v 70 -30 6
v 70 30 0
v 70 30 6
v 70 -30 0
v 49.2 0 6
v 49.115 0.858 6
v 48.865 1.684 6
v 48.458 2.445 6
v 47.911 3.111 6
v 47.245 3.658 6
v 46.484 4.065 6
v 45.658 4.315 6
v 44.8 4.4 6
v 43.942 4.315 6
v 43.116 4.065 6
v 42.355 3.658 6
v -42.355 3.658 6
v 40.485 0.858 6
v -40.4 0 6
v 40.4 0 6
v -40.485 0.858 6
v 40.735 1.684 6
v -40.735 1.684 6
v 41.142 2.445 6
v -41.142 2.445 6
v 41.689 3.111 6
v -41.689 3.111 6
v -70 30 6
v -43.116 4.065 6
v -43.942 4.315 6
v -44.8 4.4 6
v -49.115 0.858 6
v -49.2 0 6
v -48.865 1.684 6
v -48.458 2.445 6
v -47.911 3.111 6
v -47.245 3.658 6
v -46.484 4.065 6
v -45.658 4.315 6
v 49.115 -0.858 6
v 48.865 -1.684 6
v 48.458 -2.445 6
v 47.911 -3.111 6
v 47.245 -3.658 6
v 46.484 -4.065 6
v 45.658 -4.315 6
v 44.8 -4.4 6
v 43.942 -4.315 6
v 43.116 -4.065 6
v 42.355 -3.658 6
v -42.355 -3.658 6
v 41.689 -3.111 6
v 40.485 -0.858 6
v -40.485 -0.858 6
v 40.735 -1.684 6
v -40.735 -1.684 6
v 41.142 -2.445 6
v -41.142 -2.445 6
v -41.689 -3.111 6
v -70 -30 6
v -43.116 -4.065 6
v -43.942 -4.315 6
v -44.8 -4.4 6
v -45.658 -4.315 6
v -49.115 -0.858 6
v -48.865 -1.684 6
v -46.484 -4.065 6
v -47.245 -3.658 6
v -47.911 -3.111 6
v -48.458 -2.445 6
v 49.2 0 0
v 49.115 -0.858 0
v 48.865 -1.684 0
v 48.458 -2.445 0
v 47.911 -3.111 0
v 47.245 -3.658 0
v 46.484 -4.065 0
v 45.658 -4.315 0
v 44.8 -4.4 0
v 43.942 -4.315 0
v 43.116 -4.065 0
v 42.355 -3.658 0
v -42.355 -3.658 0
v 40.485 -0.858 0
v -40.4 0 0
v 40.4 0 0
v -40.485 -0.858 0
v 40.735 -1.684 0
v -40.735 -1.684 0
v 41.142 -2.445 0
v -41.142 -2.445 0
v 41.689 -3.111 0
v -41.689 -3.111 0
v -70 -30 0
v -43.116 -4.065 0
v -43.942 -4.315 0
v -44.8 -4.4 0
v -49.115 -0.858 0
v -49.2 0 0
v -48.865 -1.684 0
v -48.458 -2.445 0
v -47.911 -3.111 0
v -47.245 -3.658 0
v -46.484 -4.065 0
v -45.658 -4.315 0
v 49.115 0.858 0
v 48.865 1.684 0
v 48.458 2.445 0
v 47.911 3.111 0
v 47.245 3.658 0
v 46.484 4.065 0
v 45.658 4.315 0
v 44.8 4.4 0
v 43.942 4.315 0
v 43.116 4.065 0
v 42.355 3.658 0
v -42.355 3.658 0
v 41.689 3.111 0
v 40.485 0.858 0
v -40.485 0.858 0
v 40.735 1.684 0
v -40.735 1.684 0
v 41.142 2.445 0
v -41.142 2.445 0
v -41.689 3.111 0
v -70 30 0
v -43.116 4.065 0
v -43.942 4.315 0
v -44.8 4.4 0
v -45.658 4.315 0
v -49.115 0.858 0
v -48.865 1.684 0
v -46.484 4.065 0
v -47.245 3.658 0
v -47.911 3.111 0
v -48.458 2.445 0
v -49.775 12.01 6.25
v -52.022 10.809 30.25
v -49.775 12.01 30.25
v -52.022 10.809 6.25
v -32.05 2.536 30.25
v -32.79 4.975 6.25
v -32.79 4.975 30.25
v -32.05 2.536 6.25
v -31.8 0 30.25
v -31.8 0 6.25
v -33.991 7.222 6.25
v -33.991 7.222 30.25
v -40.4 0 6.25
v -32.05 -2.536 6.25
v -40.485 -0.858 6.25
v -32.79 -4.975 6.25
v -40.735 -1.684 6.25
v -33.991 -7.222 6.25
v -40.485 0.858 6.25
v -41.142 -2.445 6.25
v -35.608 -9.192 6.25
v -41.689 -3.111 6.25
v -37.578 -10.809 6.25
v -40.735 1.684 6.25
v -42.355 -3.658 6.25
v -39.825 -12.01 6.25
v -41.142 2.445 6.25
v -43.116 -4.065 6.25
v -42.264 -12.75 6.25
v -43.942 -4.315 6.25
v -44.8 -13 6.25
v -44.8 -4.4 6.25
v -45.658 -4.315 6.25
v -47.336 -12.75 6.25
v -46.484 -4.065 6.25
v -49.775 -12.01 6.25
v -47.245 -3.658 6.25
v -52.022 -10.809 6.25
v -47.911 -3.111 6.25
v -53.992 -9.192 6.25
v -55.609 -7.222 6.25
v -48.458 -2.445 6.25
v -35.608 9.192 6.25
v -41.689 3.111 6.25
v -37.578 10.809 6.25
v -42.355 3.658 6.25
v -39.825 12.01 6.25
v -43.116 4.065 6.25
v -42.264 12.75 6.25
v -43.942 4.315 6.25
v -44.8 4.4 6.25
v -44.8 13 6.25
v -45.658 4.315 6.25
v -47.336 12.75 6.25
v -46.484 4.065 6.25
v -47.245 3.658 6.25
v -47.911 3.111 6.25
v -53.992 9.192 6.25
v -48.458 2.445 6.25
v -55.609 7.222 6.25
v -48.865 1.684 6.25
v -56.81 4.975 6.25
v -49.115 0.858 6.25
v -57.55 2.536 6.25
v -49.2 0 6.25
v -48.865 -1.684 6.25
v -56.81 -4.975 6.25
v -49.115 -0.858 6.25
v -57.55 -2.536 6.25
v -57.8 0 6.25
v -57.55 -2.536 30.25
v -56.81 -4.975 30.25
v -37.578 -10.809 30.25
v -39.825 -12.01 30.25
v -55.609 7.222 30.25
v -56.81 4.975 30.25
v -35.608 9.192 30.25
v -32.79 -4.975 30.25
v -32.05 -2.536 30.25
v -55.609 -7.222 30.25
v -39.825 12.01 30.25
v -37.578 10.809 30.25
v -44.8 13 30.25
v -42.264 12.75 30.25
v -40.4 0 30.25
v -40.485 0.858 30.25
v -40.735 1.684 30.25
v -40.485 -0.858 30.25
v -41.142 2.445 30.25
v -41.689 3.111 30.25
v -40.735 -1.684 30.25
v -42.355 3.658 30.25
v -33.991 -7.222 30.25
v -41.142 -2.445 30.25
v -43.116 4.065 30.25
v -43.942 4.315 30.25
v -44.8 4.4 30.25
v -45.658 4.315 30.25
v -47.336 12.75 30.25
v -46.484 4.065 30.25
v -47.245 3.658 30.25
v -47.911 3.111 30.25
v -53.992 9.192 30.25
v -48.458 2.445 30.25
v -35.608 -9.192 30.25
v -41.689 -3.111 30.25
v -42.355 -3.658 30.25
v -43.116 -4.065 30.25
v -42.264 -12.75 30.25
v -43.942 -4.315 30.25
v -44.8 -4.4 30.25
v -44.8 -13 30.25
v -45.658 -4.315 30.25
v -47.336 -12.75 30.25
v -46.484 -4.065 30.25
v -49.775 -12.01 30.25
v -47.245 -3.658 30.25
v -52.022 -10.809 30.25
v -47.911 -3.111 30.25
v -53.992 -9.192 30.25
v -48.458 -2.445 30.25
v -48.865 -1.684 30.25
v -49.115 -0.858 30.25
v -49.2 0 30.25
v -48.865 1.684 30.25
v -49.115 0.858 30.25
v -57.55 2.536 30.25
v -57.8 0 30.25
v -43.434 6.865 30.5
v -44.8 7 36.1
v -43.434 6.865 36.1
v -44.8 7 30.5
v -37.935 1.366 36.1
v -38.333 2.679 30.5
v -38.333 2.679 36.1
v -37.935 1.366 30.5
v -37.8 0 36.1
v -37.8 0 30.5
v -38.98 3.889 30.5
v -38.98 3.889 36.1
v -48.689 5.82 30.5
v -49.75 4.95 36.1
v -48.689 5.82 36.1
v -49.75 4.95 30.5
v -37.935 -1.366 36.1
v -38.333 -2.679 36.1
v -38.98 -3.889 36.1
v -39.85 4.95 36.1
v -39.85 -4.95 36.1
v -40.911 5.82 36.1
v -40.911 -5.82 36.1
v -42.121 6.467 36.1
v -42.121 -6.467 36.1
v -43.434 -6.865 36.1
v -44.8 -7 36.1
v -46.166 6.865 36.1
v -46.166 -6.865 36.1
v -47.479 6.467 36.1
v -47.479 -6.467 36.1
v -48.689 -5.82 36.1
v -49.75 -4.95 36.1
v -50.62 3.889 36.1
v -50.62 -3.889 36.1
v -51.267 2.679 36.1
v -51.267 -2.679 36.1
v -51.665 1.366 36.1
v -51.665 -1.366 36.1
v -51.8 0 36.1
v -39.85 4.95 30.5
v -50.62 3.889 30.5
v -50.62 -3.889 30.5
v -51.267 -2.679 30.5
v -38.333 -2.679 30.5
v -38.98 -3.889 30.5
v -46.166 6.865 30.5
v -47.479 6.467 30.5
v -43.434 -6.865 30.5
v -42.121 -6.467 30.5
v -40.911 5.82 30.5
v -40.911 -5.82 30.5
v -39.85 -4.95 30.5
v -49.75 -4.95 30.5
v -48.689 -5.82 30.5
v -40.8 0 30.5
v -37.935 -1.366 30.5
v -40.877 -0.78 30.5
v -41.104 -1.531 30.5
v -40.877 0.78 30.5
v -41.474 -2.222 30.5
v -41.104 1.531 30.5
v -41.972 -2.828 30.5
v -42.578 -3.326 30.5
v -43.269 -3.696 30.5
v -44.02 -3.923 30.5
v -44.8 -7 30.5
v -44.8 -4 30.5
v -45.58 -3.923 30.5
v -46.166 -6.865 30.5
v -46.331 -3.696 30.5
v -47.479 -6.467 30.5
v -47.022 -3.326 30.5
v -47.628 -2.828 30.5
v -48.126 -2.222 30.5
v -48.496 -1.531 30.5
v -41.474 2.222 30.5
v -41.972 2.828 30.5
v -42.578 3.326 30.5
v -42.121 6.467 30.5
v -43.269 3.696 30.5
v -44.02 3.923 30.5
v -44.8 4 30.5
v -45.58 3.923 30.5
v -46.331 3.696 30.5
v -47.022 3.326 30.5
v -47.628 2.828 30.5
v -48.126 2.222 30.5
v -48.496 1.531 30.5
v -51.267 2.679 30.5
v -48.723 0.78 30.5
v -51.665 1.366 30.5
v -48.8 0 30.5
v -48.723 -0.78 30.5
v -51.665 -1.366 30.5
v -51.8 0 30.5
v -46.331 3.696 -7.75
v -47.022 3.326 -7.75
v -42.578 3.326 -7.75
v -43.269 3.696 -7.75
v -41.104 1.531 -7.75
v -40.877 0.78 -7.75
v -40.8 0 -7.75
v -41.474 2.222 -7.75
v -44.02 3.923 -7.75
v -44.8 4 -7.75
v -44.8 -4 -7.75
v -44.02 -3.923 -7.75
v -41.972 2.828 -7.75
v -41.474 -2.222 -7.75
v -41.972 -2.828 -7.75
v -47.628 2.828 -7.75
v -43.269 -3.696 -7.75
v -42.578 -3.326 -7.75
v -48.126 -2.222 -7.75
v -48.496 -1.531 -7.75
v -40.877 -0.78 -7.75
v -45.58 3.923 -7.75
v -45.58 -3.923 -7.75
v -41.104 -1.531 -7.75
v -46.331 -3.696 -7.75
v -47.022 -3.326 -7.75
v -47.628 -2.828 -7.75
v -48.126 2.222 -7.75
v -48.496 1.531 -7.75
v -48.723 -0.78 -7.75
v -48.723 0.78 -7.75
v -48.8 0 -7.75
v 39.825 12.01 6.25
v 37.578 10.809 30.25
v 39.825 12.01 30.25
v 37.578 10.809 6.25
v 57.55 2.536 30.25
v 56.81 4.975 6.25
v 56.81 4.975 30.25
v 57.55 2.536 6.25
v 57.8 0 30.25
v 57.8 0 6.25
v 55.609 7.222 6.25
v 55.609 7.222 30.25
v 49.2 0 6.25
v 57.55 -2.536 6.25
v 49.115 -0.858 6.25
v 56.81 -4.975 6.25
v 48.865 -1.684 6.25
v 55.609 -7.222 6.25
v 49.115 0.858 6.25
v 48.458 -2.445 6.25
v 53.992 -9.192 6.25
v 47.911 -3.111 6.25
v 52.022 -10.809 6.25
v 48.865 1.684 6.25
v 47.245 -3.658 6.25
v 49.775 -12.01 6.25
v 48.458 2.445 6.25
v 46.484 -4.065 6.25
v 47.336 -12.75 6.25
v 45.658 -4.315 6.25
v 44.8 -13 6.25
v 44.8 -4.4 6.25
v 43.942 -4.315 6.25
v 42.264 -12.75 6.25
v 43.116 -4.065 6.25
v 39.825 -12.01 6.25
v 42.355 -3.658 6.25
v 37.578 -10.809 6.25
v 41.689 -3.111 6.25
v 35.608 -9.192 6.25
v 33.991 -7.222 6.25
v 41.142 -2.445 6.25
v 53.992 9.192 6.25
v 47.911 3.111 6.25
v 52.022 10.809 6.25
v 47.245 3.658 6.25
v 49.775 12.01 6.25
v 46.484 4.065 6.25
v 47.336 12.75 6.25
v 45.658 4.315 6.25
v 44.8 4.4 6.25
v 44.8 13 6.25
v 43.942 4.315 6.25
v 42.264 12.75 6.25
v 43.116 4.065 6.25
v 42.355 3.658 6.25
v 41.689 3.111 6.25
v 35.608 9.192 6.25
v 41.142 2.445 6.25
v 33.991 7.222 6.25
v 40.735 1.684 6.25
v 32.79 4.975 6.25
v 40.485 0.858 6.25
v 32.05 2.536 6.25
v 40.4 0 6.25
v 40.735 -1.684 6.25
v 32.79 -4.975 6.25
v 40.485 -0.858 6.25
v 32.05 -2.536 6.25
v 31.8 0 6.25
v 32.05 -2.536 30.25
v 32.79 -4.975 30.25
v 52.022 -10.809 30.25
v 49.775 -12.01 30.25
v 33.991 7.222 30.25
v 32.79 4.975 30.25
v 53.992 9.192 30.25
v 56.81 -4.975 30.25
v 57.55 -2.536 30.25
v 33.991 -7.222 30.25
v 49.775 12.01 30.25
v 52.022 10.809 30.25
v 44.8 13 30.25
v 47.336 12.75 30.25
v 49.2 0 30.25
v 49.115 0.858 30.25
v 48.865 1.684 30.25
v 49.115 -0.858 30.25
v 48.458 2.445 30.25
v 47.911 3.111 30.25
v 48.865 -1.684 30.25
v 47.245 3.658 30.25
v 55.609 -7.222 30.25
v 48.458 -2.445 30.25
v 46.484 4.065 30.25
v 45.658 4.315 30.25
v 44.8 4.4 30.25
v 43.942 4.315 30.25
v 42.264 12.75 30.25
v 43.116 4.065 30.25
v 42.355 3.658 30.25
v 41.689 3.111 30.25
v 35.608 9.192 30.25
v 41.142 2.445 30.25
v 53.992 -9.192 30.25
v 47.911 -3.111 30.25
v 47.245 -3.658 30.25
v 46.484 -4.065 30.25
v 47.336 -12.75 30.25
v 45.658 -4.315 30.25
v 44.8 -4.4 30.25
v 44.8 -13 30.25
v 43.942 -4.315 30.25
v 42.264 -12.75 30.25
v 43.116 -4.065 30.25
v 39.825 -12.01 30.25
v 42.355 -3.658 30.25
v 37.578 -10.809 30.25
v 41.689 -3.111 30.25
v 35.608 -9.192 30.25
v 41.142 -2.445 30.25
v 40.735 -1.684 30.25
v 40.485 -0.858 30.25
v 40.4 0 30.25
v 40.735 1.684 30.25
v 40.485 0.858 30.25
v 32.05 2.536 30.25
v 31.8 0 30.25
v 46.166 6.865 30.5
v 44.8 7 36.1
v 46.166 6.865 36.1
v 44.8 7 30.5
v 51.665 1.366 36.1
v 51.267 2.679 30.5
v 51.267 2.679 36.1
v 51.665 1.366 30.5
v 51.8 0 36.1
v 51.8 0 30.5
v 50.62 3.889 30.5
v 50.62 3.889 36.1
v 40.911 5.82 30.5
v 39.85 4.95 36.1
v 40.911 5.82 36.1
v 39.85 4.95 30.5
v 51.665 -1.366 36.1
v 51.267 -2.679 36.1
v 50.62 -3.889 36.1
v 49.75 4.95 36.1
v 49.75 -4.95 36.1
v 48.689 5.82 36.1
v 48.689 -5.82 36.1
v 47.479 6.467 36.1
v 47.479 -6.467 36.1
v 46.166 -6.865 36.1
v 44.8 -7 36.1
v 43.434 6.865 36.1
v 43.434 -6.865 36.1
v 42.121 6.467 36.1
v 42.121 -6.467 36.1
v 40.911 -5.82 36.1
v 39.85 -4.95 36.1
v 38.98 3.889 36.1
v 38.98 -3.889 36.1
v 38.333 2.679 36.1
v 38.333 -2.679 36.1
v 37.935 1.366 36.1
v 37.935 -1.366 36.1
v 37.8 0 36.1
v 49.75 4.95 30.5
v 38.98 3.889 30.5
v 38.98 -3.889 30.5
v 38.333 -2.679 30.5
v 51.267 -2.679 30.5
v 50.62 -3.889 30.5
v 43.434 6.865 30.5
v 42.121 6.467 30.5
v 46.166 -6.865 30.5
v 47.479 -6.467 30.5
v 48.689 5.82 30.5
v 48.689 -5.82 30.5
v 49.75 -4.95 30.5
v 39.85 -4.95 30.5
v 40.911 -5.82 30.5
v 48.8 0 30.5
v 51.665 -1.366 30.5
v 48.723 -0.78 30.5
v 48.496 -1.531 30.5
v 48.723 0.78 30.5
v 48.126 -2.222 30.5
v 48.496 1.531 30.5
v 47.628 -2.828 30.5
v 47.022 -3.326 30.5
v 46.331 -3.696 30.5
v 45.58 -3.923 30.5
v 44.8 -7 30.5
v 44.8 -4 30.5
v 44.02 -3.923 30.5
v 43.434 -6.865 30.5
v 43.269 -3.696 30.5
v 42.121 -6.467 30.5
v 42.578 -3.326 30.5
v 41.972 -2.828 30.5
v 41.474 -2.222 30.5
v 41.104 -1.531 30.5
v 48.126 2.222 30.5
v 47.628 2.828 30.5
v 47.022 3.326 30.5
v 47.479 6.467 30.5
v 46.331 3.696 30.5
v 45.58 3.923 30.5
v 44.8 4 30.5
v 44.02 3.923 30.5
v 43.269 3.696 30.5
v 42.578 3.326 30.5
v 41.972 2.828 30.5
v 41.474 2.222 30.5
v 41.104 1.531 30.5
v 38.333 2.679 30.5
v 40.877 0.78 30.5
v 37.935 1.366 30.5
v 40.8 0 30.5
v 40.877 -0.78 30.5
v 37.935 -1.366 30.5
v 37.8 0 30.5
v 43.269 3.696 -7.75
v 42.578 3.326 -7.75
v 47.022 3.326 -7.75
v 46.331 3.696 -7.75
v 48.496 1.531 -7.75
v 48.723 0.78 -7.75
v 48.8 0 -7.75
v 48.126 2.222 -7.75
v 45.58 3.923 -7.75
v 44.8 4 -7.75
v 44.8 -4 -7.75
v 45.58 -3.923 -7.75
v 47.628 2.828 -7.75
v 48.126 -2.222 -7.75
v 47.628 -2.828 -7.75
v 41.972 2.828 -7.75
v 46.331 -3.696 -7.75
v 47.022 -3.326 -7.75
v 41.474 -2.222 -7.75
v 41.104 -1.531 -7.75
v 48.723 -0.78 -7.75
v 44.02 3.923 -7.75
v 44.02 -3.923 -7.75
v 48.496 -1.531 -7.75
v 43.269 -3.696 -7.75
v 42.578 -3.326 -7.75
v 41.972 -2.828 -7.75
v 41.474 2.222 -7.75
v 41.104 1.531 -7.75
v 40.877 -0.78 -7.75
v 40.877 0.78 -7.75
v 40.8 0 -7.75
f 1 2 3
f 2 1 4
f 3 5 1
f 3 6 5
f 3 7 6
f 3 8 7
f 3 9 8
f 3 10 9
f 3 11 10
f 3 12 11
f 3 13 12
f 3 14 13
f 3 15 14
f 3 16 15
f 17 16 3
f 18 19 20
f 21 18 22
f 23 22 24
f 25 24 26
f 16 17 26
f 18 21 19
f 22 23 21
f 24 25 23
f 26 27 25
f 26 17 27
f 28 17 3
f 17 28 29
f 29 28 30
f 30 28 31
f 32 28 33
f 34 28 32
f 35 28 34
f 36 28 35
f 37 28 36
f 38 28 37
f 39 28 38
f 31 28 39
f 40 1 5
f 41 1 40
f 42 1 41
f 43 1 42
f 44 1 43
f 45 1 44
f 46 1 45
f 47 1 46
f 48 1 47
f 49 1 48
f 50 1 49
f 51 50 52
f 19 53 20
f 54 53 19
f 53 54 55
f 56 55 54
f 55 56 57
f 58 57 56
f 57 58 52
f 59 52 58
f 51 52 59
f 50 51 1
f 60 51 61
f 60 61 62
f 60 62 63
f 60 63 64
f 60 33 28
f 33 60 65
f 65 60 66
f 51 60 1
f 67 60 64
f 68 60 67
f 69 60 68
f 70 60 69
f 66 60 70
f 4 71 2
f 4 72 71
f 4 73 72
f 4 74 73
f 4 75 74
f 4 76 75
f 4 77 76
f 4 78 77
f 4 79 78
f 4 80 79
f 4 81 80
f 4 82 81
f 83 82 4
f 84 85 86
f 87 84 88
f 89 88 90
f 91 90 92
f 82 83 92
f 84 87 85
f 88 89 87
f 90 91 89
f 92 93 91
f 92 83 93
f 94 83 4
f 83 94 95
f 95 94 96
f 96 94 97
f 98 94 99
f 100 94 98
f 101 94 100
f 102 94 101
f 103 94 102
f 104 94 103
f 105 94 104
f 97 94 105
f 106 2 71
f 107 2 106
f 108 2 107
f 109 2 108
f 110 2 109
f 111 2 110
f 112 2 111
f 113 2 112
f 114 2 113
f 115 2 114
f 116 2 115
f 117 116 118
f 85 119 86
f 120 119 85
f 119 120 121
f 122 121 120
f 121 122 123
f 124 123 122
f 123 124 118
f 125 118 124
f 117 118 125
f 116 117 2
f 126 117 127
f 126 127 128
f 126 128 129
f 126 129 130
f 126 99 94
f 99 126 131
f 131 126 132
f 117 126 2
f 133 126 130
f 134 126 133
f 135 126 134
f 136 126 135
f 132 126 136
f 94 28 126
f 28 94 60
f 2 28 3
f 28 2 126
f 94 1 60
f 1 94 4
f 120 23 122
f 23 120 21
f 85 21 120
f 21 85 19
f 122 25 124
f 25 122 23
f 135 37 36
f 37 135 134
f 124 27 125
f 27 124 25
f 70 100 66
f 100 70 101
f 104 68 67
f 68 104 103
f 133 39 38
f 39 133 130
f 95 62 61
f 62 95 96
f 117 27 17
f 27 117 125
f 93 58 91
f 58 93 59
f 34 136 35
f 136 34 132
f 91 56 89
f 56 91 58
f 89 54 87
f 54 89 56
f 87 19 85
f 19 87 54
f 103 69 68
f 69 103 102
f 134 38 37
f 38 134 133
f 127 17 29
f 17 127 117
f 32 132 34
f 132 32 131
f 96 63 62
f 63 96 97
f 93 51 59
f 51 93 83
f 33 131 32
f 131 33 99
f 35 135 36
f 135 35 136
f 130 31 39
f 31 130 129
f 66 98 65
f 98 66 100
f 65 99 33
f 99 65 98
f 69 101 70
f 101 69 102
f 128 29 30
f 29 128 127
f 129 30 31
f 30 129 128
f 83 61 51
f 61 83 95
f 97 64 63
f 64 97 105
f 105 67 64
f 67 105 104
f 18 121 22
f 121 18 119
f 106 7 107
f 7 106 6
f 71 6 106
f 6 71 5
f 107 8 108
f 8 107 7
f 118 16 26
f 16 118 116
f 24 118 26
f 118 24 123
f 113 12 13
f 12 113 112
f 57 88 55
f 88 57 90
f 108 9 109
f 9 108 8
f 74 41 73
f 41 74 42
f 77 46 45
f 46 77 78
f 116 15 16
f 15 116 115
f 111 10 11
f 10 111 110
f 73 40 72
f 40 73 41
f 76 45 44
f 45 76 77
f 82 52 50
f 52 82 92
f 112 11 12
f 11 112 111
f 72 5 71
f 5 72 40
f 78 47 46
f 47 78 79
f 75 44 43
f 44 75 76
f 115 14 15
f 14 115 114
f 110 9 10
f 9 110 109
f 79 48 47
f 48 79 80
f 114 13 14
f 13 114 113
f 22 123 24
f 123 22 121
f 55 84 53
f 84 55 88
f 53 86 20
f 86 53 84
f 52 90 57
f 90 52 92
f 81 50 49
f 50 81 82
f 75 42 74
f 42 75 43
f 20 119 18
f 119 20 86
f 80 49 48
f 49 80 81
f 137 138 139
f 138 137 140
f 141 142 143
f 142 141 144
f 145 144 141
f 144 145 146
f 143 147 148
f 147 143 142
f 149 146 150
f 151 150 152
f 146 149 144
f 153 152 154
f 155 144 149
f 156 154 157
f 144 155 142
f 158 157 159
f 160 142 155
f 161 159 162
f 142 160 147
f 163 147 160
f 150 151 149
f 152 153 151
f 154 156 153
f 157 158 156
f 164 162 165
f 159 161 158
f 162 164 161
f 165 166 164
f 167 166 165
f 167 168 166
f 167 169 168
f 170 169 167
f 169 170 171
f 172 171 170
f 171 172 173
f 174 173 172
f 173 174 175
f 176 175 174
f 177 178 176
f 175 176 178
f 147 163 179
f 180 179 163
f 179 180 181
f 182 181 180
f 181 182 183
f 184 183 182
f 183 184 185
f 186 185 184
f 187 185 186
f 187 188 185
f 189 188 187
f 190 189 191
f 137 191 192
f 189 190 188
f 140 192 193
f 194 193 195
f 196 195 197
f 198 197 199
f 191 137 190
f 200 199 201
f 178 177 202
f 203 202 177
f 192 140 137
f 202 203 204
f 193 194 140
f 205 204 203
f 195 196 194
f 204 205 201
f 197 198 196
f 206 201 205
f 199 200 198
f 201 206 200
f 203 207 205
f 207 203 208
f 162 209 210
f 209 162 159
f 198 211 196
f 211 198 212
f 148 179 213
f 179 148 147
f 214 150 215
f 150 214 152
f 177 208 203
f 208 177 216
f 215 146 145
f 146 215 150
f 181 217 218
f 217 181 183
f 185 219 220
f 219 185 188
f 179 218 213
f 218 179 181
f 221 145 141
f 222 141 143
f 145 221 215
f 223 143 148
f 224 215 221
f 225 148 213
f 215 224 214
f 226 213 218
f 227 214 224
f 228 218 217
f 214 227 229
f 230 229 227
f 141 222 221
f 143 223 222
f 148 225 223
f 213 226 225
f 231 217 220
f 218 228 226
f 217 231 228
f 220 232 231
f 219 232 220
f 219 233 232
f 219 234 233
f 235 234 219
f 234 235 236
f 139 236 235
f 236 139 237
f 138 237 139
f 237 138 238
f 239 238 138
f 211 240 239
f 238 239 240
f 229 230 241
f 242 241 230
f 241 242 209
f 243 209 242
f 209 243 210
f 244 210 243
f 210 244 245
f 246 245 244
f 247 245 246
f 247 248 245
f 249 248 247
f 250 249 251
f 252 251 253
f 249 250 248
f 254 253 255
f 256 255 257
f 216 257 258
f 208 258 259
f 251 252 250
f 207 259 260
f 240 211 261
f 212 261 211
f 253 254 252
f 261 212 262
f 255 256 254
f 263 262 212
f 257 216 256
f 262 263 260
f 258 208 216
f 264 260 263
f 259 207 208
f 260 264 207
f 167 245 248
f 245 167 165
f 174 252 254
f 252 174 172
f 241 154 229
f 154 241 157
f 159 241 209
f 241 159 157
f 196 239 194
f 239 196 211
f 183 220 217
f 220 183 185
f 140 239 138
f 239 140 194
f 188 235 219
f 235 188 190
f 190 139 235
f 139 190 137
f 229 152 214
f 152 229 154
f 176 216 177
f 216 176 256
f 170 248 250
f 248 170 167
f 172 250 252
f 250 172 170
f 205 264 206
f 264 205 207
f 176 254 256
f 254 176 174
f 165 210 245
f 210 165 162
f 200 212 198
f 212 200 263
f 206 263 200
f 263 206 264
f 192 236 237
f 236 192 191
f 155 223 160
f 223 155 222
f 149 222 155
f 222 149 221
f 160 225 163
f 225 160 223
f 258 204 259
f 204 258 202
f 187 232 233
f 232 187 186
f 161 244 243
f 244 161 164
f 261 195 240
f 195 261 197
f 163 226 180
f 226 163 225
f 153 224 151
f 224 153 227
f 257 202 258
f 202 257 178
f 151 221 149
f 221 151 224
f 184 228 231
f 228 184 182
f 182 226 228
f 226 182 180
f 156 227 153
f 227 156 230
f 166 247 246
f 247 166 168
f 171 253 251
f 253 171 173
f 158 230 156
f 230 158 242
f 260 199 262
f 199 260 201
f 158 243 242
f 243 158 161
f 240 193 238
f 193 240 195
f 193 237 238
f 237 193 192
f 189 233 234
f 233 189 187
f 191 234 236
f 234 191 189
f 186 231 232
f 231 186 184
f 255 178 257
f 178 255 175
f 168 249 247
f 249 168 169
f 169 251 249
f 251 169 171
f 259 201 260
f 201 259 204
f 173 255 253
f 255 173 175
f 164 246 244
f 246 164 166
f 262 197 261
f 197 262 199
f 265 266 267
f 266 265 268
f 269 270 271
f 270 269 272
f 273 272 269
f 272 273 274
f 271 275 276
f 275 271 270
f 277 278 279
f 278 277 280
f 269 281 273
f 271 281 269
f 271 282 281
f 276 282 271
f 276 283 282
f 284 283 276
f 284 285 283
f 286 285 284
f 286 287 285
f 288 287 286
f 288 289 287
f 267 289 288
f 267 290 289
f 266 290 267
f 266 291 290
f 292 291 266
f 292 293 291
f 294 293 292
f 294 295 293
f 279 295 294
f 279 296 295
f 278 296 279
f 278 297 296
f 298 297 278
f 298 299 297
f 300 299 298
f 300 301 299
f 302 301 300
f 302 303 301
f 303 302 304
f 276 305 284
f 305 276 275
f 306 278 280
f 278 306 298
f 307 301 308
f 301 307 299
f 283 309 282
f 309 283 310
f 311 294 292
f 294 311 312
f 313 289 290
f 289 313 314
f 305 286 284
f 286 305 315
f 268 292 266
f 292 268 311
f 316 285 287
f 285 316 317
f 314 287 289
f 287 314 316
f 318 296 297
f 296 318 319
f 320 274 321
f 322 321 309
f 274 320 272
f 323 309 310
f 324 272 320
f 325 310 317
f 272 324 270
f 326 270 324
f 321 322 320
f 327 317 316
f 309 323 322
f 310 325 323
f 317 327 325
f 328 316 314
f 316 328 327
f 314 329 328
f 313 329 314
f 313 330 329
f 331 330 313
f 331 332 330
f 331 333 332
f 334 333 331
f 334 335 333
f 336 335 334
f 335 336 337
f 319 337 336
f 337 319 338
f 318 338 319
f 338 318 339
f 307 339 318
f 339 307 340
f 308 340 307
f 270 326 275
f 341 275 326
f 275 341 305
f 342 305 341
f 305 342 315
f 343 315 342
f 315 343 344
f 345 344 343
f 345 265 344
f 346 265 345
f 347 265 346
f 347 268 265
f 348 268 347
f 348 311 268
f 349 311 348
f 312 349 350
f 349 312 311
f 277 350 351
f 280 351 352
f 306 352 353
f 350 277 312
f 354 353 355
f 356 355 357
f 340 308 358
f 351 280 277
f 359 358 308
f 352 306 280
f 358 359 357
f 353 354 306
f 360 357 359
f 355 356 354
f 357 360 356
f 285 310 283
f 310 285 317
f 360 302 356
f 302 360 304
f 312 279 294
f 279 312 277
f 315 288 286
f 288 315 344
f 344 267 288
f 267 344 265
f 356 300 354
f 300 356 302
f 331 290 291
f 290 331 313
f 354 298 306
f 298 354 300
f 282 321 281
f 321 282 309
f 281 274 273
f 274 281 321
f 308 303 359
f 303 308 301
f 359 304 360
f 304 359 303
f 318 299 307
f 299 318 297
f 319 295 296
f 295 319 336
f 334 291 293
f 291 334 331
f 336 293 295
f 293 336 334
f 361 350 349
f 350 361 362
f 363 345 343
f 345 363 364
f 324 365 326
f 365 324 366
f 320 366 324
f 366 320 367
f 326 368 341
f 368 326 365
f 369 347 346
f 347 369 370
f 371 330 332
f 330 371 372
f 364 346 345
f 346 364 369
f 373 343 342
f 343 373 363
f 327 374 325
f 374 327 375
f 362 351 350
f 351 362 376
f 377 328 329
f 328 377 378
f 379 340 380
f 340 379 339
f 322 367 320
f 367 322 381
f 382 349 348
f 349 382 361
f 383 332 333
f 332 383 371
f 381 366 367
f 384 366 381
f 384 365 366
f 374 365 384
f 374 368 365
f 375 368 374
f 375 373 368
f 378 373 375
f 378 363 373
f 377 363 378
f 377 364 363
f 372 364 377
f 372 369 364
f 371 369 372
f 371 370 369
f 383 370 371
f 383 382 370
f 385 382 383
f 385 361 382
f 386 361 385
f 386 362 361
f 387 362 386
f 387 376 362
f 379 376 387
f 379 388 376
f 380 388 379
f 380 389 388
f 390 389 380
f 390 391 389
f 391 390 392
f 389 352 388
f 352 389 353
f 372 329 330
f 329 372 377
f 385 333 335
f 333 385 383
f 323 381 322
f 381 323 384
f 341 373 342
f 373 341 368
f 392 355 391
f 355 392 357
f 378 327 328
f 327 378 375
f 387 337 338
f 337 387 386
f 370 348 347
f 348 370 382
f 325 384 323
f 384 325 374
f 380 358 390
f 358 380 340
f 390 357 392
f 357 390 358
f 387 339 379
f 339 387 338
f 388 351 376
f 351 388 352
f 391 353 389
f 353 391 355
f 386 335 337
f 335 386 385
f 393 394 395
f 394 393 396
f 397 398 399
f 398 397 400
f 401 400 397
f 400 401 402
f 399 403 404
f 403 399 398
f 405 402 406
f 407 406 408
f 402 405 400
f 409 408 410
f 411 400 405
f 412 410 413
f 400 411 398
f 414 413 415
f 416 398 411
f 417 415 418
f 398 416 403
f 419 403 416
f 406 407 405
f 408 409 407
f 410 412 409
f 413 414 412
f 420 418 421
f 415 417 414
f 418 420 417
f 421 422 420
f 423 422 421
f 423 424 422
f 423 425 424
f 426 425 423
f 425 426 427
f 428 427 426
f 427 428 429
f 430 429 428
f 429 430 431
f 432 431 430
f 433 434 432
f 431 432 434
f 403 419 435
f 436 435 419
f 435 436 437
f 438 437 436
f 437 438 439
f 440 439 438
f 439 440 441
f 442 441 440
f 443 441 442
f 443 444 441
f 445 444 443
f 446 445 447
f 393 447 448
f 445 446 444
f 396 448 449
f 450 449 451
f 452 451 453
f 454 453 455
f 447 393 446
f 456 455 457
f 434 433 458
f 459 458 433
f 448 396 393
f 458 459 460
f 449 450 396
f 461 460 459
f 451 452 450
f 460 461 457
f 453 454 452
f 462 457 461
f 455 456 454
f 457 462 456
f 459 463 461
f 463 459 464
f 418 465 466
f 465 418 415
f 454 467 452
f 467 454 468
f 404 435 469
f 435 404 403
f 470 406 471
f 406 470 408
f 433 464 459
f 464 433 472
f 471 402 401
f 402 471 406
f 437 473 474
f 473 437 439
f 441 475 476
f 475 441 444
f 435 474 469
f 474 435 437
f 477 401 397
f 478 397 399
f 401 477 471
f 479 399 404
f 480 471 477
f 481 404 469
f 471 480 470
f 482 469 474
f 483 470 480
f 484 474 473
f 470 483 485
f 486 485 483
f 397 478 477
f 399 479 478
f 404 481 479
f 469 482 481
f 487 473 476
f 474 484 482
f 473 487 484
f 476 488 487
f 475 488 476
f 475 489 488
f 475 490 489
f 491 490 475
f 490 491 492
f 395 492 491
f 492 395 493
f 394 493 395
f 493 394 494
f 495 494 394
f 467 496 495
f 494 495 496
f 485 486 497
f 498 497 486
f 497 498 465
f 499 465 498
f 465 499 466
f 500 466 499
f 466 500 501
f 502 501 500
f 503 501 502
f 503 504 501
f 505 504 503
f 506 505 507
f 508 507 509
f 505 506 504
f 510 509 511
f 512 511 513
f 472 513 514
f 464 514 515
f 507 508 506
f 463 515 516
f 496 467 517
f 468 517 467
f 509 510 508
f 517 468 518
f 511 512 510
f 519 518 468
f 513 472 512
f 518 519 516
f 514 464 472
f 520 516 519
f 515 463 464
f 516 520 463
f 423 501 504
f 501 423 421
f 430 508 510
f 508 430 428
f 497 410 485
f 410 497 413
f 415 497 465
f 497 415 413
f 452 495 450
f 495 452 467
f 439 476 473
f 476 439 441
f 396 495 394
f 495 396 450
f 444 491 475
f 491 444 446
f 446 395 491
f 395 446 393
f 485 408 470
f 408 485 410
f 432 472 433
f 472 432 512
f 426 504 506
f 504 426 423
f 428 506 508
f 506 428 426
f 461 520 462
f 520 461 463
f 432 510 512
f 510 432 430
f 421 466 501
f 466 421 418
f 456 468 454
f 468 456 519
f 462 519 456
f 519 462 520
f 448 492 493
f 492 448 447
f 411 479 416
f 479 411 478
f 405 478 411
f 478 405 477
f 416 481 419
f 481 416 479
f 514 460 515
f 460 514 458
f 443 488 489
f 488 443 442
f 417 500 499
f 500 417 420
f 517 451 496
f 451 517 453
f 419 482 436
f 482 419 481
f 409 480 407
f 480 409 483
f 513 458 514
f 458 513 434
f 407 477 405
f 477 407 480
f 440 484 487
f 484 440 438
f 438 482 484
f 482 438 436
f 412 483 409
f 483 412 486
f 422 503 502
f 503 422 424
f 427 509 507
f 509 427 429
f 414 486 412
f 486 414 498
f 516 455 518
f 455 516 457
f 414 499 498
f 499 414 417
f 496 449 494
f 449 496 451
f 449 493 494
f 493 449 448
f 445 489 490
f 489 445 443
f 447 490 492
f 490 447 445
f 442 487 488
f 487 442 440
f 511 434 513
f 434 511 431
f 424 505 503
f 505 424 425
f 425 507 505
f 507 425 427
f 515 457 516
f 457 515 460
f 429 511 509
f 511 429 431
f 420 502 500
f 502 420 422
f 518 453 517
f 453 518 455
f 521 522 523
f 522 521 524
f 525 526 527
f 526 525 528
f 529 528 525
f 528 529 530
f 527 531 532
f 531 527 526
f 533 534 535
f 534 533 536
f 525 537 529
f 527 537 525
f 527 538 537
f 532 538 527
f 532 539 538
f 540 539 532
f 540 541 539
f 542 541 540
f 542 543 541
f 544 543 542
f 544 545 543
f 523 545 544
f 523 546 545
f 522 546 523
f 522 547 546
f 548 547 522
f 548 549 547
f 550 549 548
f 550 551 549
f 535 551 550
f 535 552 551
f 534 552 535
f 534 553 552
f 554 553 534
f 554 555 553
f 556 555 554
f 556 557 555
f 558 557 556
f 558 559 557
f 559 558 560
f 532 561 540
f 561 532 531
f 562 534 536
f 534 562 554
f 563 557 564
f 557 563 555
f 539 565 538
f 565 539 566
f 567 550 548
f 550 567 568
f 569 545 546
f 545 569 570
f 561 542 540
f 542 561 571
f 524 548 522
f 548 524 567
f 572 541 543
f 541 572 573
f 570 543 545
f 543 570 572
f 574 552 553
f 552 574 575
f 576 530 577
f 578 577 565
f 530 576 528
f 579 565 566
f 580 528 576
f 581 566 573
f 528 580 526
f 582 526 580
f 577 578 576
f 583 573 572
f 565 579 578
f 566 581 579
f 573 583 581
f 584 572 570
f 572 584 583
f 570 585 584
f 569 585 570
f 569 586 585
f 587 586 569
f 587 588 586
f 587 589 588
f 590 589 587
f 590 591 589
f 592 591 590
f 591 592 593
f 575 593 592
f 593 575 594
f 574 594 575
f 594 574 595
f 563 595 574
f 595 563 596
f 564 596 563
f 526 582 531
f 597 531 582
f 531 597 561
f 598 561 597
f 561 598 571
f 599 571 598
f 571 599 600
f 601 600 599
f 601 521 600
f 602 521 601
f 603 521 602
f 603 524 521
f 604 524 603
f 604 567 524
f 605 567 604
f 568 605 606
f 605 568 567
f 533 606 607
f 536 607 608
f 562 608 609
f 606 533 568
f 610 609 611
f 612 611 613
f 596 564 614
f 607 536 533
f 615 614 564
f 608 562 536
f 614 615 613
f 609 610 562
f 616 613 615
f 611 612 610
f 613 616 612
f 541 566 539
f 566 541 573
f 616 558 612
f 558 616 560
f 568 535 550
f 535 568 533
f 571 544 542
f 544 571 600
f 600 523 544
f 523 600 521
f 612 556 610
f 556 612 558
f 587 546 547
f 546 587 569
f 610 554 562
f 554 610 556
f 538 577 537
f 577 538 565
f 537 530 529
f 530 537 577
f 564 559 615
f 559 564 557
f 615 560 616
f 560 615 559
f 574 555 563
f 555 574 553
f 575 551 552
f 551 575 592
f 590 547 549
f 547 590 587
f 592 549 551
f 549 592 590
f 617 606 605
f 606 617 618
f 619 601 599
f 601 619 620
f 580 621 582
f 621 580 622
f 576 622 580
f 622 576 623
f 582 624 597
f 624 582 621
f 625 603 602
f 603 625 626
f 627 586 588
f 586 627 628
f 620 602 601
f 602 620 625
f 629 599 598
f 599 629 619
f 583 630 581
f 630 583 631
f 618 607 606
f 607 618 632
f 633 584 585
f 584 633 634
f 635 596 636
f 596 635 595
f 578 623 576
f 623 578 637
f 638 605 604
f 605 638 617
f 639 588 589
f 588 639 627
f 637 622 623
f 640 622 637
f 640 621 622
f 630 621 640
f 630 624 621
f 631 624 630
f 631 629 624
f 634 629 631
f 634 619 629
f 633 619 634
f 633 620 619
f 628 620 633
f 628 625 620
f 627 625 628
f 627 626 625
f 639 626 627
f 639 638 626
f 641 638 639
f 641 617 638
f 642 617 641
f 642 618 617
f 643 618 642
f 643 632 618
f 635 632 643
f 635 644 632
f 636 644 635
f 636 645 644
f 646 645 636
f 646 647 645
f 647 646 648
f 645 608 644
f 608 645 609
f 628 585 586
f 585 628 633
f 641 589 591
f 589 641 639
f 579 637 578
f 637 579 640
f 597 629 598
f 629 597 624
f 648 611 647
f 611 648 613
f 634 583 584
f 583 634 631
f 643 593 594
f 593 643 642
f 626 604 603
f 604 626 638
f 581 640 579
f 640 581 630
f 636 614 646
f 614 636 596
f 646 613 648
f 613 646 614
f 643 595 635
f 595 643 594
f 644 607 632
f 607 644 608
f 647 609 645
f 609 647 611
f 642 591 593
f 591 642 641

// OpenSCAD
$fn = 32;

// ------------------------------------------------------------------------
// Standoff columns: 2 d26 standoffs, bolts d8
// Every part is its own module, assembly() places them once.
// ------------------------------------------------------------------------

// --- part 1 ---
module base_plate() {
  difference() {
    translate([-70, -30, 0]) cube([140, 60, 6]);
    translate([-44.8, 0, -1]) cylinder(h = 8, d = 8.8);
    translate([44.8, 0, -1]) cylinder(h = 8, d = 8.8);
  }
}

// --- part 2 ---
module spacer1() {
  difference() {
      translate([0, 0, 0]) cylinder(h = 24, d = 26);
      translate([0, 0, -1]) cylinder(h = 26, d = 8.8);
    }
}

// --- part 3 ---
module bolt1() {
  cylinder(h = 5.6, d = 14);
  translate([0, 0, -38.25]) cylinder(h = 38.25, d = 8);
}

// --- part 4 ---
module spacer2() {
  difference() {
      translate([0, 0, 0]) cylinder(h = 24, d = 26);
      translate([0, 0, -1]) cylinder(h = 26, d = 8.8);
    }
}

// --- part 5 ---
module bolt2() {
  cylinder(h = 5.6, d = 14);
  translate([0, 0, -38.25]) cylinder(h = 38.25, d = 8);
}

// --- assembly ---
module assembly() {
  translate([0, 0, 0]) rotate([0, 0, 0]) base_plate();
  translate([-44.8, 0, 6.25]) rotate([0, 0, 0]) spacer1();
  translate([-44.8, 0, 30.5]) rotate([0, 0, 0]) bolt1();
  translate([44.8, 0, 6.25]) rotate([0, 0, 0]) spacer2();
  translate([44.8, 0, 30.5]) rotate([0, 0, 0]) bolt2();
}

assembly();
